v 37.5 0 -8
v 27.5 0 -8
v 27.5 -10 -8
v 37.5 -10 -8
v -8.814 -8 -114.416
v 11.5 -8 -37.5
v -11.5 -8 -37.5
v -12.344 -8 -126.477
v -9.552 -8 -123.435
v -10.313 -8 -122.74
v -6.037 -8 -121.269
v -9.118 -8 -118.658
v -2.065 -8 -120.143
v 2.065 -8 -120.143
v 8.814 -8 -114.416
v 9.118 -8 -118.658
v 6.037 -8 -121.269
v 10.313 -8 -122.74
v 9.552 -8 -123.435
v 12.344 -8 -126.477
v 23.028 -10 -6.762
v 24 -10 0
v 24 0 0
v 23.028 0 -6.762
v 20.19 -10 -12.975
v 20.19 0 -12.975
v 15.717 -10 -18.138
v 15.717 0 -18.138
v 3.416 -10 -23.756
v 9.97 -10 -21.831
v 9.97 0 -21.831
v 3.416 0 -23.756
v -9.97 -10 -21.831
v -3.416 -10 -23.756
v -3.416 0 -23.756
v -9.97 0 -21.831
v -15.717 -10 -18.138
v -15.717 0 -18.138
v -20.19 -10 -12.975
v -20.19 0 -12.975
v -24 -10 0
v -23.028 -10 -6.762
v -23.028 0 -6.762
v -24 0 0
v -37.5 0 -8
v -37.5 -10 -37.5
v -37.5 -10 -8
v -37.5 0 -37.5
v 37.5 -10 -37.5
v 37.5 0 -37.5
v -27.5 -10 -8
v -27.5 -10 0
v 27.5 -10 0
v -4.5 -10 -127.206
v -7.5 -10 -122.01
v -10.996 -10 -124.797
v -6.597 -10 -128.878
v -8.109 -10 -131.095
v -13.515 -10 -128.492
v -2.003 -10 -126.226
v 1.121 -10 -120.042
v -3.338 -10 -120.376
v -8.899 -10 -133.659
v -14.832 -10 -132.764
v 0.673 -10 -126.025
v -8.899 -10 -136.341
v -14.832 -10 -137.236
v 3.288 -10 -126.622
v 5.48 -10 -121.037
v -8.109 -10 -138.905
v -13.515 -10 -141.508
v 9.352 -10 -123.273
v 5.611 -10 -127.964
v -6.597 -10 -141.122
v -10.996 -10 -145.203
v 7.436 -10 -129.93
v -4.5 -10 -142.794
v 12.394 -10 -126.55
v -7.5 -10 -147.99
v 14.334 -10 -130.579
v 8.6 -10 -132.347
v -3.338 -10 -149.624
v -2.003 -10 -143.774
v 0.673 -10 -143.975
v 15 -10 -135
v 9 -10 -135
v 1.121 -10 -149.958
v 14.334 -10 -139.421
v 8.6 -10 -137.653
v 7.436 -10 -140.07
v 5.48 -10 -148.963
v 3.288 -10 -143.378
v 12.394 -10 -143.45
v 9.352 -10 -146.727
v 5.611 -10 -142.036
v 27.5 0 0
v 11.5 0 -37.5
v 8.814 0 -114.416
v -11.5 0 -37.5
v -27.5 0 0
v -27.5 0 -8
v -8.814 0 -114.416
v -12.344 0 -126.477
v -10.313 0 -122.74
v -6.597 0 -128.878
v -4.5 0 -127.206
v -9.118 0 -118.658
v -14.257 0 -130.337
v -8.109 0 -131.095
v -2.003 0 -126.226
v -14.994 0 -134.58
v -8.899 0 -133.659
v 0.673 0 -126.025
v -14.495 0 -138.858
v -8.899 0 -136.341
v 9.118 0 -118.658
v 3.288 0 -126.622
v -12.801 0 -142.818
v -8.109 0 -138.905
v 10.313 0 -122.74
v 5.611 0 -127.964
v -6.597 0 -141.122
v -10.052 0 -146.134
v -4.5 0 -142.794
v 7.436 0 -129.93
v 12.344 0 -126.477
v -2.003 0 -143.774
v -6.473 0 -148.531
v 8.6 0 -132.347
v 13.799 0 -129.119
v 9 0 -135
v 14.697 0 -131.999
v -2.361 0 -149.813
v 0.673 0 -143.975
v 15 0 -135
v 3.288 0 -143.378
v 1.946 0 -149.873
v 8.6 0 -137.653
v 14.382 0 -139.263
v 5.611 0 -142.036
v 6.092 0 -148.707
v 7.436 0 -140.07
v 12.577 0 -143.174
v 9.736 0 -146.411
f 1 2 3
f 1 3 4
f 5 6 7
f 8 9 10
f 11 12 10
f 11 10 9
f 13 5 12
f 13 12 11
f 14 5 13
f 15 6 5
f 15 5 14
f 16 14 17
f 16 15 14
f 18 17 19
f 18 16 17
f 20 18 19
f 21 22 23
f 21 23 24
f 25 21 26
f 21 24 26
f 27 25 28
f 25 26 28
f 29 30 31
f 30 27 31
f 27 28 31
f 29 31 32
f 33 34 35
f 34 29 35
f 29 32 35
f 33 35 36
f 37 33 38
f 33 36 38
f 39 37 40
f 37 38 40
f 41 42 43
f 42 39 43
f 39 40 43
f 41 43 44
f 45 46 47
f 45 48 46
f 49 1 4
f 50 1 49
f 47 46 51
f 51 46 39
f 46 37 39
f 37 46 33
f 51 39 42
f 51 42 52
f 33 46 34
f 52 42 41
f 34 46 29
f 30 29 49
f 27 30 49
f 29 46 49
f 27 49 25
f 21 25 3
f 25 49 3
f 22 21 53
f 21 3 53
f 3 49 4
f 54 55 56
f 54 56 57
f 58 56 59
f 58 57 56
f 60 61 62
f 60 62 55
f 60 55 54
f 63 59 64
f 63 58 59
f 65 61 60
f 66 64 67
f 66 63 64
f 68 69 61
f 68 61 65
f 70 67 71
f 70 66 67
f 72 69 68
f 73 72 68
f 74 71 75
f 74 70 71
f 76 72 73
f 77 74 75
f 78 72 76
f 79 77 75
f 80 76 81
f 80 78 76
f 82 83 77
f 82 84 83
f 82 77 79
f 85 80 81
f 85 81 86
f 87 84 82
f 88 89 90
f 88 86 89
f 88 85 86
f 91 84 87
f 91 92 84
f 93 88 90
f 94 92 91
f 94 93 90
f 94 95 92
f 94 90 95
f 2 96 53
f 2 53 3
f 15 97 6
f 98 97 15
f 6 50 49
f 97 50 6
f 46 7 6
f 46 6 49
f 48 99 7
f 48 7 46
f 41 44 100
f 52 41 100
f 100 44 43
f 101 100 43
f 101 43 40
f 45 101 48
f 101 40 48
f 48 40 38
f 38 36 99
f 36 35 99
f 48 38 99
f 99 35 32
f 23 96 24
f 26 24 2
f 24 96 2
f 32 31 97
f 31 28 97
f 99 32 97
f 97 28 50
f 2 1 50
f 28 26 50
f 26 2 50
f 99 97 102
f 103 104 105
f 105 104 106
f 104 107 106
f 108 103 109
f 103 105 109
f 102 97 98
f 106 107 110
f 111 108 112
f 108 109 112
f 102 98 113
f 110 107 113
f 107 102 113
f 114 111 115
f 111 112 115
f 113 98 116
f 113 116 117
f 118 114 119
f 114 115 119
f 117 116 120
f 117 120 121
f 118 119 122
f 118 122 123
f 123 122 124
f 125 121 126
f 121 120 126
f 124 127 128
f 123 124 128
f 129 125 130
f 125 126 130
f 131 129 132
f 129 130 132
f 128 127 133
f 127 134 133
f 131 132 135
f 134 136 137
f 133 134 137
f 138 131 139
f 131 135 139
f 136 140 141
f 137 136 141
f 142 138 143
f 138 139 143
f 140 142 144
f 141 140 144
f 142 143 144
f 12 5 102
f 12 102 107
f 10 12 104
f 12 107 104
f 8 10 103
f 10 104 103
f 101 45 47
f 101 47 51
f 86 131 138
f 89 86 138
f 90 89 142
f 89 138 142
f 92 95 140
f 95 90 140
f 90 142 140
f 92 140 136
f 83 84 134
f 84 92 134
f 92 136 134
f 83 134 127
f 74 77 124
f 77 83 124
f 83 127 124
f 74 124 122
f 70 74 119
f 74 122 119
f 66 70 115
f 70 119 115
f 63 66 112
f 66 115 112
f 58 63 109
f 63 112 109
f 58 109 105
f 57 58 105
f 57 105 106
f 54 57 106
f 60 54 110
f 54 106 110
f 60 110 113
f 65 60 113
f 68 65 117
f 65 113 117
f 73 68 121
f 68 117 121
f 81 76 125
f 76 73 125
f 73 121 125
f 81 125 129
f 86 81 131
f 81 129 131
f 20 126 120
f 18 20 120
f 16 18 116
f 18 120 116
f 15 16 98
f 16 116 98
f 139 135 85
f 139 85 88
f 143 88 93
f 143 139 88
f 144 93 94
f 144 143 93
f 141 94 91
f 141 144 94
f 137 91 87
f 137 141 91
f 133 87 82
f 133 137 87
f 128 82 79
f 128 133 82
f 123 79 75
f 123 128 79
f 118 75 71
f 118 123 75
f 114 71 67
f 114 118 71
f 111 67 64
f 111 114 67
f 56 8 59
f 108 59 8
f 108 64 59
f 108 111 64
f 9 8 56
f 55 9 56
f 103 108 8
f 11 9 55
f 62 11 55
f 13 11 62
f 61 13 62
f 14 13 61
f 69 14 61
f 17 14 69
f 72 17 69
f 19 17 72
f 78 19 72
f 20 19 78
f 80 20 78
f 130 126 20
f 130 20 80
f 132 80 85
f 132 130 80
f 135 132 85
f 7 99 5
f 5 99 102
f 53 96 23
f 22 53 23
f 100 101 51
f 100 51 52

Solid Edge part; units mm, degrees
sketch "Sketch1" plane through (0, 0, 0) normal (0, -1, 0) x (1, 0, 0)
  line L0 (-27.5, -8) -> (-27.5, 0)
  line L1 (-24, 0) -> (-27.5, 0)
  line L2 (27.5, 0) -> (24, 0)
  line L3 (27.5, 0) -> (27.5, -8)
  line L4 (27.5, -8) -> (37.5, -8)
  line L5 (37.5, -8) -> (37.5, -37.5)
  line L6 (37.5, -37.5) -> (-37.5, -37.5)
  line L7 (-37.5, -37.5) -> (-37.5, -8)
  line L8 (-37.5, -8) -> (-27.5, -8)
  arc A0 (-24, 0) -> (24, 0) centre (0, 0) ccw
extrude "Protrusion1" add sketch "Sketch1" along normal blind 10
sketch "Sketch2" plane through (0, 0, 0) normal (0, -1, 0) x (1, 0, 0)
  line L0 (11.5, -37.5) -> (-11.5, -37.5)
  line L1 (-11.5, -37.5) -> (-8.814, -114.416)
  arc A0 (-8.814, -114.416) -> (-12.3437, -126.4774) centre (-28.8019, -115.114) cw
  arc A1 (8.814, -114.416) -> (12.3437, -126.4774) centre (28.8019, -115.114) ccw
  line L2 (11.5, -37.5) -> (8.814, -114.416)
  arc A2 (-12.3437, -126.4774) -> (12.3437, -126.4774) centre (0, -135) cw
extrude "Protrusão_Extrudada_2" add sketch "Sketch2" along normal blind 8
sketch "Sketch3" plane through (0, 0, 0) normal (0, -1, 0) x (1, 0, 0)
  circle A0 centre (0, -135) radius 9
  circle A1 centre (0, -135) radius 15
  dimension "D1" = 135
  dimension "D2" = 100
  dimension "D3" = 50
  dimension "D4" = 30
  dimension "D5" = 18
  dimension "D6" = 75
  dimension "D7" = 48
  dimension "D8" = 40
  dimension "D9" = 13
  dimension "D10" = 9
  dimension "D11" = 11.5
  dimension "D12" = 8
  dimension "D13" = 55
extrude "Protrusão_Extrudada_4" add sketch "Sketch3" along normal blind 10
